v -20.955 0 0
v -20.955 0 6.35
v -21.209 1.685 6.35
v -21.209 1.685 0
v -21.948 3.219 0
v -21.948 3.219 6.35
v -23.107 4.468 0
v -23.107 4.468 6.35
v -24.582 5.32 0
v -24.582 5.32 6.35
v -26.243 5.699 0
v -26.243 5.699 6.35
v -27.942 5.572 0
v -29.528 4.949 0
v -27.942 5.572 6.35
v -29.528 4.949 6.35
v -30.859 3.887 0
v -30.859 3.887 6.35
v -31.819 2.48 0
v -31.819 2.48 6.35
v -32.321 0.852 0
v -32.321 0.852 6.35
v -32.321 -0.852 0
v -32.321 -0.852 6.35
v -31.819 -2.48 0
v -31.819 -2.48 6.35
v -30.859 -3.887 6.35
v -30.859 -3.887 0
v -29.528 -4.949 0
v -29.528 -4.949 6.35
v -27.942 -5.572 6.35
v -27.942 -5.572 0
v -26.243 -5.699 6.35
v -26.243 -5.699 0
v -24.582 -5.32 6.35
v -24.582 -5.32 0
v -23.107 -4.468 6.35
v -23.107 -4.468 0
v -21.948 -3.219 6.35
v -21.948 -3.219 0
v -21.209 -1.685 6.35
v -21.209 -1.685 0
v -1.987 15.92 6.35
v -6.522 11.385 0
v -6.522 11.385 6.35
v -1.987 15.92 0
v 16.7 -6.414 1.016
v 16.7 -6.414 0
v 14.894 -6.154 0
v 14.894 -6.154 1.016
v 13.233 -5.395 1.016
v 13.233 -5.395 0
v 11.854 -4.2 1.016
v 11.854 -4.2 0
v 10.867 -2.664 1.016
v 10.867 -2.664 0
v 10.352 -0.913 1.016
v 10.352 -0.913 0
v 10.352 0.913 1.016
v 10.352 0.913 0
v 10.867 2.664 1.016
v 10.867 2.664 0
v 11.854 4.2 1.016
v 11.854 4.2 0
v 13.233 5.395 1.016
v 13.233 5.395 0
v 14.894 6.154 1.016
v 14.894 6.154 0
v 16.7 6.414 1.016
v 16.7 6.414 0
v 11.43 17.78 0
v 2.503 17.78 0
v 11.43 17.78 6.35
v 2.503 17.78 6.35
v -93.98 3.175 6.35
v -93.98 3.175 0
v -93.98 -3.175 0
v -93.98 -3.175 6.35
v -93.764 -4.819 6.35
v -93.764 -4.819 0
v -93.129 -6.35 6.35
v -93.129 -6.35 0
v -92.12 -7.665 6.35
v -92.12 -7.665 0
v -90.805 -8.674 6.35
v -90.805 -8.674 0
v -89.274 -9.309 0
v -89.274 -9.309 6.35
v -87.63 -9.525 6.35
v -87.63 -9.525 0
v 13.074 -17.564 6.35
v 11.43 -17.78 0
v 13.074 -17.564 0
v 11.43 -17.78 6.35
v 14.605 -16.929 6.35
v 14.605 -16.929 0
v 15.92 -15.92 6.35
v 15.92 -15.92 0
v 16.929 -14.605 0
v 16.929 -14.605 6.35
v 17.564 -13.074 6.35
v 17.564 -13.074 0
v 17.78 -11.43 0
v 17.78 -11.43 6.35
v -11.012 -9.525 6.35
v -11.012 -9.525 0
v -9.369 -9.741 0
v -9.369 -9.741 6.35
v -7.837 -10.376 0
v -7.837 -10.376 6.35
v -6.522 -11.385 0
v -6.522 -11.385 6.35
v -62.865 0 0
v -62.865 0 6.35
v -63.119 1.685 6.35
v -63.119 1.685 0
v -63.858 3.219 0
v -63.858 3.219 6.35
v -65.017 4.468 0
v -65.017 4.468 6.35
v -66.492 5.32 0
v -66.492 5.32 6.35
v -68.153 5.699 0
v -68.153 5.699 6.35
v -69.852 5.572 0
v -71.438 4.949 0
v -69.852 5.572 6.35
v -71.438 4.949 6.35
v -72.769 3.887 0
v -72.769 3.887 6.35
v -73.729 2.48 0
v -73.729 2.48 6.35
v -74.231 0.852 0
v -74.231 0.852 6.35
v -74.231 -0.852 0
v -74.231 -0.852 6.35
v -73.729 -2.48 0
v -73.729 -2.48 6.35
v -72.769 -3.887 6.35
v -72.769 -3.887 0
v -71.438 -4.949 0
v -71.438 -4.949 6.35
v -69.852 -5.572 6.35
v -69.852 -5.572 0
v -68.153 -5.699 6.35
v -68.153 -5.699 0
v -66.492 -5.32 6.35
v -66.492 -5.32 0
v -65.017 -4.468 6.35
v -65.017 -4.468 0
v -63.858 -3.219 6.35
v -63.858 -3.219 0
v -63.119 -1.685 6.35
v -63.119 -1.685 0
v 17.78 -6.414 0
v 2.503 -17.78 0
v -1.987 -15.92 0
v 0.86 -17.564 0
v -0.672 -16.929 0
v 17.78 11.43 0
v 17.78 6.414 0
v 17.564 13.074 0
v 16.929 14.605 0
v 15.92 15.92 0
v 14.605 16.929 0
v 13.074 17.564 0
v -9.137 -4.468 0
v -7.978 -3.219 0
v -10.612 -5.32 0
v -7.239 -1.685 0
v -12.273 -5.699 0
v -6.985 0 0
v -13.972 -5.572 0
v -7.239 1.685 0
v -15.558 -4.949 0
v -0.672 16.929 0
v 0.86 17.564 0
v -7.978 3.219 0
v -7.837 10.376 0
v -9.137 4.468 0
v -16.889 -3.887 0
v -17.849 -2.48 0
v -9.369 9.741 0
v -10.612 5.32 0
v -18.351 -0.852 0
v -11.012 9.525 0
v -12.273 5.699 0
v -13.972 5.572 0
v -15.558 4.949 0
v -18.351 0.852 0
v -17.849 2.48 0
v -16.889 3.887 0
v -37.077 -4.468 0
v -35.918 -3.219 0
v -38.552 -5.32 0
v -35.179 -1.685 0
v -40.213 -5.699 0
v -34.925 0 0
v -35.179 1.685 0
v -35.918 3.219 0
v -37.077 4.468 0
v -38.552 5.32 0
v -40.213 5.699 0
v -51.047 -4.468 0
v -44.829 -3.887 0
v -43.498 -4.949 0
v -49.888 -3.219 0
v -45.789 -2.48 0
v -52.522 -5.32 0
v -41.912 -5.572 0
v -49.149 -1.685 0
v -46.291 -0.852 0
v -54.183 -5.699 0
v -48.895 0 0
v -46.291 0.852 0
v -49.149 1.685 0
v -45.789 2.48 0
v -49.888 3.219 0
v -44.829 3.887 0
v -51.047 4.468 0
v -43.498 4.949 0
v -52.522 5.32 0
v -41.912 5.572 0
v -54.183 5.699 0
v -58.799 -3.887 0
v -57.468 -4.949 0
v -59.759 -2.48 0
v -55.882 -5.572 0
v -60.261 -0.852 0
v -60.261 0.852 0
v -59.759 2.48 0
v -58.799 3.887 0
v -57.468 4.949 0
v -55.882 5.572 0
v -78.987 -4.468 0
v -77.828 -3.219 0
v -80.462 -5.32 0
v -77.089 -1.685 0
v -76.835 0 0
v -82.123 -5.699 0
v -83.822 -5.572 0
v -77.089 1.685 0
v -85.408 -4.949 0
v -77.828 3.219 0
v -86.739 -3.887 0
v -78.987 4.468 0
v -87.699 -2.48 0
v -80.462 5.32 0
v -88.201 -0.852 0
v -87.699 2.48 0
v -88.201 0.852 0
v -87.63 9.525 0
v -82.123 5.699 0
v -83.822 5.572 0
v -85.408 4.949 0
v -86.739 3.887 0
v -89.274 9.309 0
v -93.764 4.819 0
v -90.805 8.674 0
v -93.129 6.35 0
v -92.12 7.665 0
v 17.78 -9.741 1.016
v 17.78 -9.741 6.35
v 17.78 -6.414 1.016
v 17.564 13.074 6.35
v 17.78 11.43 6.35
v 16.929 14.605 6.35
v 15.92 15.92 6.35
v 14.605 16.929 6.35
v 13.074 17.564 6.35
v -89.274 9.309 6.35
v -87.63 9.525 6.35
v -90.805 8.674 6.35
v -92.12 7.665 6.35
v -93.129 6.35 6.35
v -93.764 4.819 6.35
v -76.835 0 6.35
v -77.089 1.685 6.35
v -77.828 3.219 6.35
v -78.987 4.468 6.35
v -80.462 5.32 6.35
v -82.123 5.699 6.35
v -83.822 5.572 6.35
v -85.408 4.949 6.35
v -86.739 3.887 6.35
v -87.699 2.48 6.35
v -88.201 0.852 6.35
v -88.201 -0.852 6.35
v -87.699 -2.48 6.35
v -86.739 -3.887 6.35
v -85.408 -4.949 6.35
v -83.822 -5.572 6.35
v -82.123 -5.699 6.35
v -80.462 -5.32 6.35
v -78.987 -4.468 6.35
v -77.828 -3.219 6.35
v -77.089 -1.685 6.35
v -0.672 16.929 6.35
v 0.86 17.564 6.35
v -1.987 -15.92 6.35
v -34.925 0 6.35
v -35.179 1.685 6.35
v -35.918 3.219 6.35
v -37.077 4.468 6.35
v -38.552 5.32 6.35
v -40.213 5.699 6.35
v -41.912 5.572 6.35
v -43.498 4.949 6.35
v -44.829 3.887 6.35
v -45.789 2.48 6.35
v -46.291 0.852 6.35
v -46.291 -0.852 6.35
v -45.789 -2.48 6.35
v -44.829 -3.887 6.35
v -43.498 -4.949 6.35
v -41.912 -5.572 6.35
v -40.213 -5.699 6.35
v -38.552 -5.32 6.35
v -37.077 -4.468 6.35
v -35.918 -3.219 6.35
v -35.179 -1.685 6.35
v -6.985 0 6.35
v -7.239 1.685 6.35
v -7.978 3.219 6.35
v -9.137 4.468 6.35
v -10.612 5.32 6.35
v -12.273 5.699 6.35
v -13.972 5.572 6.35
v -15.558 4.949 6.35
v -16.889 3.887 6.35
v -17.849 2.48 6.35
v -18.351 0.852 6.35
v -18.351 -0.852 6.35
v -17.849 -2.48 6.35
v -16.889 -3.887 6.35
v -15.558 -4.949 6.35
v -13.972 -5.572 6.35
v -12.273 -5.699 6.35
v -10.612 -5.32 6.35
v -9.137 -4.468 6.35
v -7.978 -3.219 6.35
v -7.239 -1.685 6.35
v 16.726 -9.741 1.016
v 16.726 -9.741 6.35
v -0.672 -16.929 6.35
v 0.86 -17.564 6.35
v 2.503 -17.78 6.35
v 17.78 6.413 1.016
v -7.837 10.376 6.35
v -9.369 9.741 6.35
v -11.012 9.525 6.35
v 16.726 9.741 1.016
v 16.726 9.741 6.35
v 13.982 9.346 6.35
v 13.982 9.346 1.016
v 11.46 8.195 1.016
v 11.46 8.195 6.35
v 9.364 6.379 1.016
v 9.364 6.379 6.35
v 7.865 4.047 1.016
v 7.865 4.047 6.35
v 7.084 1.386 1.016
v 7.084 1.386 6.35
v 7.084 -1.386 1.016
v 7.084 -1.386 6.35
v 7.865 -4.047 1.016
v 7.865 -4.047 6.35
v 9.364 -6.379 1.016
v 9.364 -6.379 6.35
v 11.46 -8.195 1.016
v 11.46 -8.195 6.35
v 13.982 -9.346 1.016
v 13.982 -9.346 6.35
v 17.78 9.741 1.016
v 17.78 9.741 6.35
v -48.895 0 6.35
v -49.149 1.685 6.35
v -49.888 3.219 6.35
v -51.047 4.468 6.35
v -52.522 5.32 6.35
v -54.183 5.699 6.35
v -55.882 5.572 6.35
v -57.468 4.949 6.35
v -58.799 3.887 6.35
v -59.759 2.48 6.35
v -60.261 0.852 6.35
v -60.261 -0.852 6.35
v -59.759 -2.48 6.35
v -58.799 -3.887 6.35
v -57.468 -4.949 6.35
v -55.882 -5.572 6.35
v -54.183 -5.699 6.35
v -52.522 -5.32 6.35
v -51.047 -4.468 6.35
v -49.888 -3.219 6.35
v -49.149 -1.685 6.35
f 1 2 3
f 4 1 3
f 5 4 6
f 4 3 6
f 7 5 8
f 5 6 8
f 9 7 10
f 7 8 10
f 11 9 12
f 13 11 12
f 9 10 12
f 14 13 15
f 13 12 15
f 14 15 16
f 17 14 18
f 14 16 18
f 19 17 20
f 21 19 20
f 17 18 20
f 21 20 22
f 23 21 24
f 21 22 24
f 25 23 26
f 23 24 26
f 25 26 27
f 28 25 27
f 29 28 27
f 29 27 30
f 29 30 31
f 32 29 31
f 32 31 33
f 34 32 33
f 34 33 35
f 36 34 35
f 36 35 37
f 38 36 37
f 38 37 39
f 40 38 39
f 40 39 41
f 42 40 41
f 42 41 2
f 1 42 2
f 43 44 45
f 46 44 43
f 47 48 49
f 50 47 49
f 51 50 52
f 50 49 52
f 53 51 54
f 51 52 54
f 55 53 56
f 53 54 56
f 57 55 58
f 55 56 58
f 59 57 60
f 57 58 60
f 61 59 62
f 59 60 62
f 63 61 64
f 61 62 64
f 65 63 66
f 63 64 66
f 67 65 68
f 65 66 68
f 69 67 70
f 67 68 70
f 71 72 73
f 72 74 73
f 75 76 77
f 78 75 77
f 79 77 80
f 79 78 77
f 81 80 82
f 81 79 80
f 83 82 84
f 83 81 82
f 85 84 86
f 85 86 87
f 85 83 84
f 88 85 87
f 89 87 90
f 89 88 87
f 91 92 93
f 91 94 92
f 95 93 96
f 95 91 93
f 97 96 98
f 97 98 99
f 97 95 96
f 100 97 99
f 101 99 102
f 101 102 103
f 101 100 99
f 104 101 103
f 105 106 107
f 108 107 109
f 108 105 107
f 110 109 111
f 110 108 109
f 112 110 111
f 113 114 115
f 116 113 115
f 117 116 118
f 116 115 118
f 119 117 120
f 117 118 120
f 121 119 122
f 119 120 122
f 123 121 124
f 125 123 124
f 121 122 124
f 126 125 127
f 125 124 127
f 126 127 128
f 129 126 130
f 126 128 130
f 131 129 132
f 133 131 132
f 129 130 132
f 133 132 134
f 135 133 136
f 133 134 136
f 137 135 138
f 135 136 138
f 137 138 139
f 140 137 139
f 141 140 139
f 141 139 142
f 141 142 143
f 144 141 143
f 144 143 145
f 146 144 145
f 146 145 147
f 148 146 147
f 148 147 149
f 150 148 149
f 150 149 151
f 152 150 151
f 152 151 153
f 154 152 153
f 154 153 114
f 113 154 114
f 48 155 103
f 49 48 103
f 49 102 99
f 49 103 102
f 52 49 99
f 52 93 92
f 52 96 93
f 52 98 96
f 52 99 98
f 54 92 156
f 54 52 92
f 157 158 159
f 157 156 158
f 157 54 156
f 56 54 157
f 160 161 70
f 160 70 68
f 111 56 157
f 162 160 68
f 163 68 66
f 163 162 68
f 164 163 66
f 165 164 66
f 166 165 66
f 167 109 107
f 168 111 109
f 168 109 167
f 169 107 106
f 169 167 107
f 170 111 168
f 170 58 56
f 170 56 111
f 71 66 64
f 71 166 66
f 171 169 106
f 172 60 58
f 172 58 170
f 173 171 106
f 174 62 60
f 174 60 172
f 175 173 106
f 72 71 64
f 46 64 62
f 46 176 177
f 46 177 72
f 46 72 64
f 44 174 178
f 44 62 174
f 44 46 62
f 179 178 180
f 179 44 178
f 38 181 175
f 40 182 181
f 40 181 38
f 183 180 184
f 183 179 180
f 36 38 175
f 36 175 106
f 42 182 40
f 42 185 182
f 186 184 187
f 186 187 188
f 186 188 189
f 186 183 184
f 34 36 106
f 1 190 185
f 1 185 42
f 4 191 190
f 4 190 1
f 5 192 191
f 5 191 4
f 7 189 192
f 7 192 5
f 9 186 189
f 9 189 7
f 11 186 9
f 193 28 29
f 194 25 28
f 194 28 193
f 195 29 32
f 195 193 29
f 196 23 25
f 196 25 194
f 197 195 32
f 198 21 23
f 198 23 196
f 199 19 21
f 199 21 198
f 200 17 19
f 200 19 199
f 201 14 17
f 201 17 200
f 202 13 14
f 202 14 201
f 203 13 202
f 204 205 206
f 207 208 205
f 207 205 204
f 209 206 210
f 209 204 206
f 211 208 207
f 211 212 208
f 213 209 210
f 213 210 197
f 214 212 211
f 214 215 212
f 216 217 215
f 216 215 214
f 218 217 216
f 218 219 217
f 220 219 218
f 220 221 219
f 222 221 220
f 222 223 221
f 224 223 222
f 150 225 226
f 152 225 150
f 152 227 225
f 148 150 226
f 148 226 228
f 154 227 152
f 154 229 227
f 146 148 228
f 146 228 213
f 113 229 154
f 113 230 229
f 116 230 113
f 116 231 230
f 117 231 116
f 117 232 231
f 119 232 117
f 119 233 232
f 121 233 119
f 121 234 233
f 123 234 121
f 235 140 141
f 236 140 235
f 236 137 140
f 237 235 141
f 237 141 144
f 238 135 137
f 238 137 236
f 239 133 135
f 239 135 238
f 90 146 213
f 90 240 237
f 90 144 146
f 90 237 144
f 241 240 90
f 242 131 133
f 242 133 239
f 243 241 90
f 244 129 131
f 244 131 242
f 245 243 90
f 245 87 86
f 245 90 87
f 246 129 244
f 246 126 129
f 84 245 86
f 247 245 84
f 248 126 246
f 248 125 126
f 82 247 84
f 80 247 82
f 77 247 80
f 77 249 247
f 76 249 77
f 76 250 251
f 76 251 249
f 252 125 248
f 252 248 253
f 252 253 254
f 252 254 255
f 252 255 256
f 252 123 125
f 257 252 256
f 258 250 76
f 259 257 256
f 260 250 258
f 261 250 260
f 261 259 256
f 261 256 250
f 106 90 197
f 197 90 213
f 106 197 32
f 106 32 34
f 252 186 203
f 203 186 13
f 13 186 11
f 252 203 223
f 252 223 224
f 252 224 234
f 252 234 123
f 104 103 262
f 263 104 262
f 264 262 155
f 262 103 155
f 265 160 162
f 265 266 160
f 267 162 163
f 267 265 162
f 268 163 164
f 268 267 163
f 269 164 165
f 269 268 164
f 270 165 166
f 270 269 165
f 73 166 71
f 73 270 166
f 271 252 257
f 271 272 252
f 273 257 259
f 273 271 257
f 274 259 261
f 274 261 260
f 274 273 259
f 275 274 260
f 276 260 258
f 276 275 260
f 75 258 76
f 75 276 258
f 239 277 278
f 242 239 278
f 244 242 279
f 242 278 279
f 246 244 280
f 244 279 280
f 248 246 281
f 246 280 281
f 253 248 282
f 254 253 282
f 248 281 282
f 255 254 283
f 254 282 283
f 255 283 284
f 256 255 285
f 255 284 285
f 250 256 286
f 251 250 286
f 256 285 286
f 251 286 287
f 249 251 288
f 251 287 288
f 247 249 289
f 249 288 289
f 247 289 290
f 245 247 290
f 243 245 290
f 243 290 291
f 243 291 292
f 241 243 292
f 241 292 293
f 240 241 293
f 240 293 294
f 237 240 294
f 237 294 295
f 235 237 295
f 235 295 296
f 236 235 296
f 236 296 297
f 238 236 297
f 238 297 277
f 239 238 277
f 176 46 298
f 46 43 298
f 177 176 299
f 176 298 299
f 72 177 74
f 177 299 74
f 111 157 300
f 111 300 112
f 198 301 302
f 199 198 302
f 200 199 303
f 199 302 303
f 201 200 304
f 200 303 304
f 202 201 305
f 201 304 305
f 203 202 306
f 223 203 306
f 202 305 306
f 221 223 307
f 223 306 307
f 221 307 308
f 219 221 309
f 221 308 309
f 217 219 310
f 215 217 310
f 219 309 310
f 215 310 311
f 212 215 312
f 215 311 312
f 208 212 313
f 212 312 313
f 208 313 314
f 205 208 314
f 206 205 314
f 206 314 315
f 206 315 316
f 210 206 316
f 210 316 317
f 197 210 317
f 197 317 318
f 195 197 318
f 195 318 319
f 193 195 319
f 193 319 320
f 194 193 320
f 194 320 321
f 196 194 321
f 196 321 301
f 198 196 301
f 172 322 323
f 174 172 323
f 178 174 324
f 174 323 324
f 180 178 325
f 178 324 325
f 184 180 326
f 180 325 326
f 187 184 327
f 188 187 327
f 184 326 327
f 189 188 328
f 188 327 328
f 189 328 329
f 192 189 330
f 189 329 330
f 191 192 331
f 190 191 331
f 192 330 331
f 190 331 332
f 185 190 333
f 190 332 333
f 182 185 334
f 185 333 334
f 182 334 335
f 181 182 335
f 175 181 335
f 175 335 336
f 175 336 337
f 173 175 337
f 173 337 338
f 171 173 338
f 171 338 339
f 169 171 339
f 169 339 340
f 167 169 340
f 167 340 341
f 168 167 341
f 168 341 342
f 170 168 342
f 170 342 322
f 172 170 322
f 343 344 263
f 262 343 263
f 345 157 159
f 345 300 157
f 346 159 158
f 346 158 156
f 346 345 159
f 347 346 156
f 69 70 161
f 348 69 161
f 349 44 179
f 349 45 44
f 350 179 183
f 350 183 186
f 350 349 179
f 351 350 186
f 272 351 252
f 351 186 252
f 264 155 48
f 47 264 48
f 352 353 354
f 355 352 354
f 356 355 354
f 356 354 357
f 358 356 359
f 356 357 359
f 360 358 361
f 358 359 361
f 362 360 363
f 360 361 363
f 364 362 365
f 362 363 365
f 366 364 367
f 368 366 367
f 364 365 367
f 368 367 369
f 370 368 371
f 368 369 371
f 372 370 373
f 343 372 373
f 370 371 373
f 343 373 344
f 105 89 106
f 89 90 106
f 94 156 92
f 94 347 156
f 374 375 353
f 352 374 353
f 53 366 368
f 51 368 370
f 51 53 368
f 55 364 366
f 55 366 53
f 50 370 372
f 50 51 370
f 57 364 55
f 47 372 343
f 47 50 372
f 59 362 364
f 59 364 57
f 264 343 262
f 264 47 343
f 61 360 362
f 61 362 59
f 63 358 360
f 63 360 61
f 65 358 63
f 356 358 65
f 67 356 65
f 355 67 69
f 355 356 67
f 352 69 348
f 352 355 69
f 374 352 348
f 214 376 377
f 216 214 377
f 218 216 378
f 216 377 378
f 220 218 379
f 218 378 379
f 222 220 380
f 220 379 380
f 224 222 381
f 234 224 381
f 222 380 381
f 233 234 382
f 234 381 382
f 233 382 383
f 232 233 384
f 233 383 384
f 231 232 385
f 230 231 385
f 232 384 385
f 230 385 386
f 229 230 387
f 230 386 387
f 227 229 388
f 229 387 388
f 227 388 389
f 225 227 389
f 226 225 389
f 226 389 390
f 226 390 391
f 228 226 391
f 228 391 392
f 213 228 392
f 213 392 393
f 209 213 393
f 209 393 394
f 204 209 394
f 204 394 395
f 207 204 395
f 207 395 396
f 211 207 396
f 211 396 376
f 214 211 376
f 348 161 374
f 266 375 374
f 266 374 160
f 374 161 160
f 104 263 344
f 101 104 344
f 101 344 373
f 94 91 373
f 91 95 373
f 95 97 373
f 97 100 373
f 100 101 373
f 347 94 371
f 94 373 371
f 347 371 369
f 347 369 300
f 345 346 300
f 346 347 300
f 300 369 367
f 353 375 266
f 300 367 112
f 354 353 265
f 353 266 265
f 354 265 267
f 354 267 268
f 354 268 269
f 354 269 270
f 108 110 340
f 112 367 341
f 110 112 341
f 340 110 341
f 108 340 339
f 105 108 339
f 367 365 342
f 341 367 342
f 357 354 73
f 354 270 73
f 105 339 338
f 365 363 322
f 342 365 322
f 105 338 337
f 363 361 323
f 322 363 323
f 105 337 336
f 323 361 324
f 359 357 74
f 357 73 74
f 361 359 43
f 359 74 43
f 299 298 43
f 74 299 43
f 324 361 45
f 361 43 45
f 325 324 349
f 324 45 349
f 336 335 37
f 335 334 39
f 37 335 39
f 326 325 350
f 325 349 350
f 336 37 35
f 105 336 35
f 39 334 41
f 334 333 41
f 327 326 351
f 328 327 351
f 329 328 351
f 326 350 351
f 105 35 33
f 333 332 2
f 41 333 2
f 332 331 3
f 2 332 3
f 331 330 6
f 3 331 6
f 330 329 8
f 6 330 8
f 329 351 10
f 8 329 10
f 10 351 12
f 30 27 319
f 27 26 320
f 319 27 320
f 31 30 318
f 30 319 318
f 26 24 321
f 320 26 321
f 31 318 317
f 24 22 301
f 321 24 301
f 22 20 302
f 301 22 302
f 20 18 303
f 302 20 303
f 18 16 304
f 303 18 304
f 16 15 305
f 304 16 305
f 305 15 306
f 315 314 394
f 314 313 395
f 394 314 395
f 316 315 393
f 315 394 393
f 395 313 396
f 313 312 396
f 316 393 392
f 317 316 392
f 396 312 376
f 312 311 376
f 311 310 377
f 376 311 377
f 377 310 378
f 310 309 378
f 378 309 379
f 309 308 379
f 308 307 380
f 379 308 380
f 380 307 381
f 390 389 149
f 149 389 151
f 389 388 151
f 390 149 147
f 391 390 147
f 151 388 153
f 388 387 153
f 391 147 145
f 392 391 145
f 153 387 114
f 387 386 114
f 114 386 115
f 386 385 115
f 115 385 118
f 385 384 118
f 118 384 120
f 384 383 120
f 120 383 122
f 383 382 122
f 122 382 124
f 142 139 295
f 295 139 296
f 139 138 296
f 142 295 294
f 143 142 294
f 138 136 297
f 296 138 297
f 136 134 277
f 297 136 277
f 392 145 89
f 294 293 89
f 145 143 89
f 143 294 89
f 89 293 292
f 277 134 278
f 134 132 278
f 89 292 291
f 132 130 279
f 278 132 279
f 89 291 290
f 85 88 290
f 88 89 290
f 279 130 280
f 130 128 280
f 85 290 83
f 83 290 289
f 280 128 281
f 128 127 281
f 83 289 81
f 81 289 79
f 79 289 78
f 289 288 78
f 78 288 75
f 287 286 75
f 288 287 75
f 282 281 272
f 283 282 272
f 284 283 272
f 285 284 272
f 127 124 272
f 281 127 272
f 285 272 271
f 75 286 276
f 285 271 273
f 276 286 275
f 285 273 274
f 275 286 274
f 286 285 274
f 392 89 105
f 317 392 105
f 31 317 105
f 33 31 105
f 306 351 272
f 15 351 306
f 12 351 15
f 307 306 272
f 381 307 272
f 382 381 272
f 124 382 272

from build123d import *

# Parameters (mm, degrees)
F1_DEPTH    = 6.35
F3_DEPTH    = 5.334
F4_W        = 17.78
F4_H        = 8.255
F5_DEPTH    = 25.4
F6_R        = 5.715
F7_DEPTH    = 25.4
F8_T4_DEPTH = 6.35
F8_T9_DEPTH = 6.35
F9_R        = 6.35


# Not quite as in the source:
# - a fillet or chamfer that OpenCascade refuses, or shapes differently, is made with other operations: its cross-section is extruded or revolved along the edge and cut away or added


with BuildPart() as f1:
    # F0 (on Top) → F1 (new body)
    with BuildSketch(Plane.XY):
        Polygon((8.1444730278, -17.78), (17.78, -17.78), (17.78, 17.78), (-17.78, 17.78), (-17.78, 9.525), (-93.98, 9.525), (-93.98, -9.525), (-17.78, -9.525), (-17.78, -17.78), (-8.1444730278, -17.78), align=None)
    extrude(amount=F1_DEPTH)

    # F2 (on face) → F3 (cut)
    with BuildSketch(Plane.XY.offset(6.35)):
        with BuildLine():
            Line((17.78, 9.7409), (16.7259, 9.7409))
            ThreePointArc((16.7259, 9.7409), (6.985, 0), (16.7259, -9.7409))
            Line((16.7259, -9.7409), (17.78, -9.7409))
            Line((17.78, -9.7409), (17.78, 9.7409))
        make_face()
    extrude(amount=-F3_DEPTH, mode=Mode.SUBTRACT)

    # F4 (on face) → F5 (cut)
    with BuildSketch(Plane(origin=(0, 0, 0), x_dir=(1, 0, 0), z_dir=(0, 0, -1))):
        with BuildLine():
            Line((17.78, 6.4135), (16.7005, 6.4135))
            ThreePointArc((16.7005, 6.4135), (10.287, 0), (16.7005, -6.4135))
            Line((16.7005, -6.4135), (17.78, -6.4135))
            Line((17.78, -6.4135), (17.78, 6.4135))
        make_face()
        with Locations((-8.89, -13.6525)):
            Rectangle(F4_W, F4_H)
        with Locations((-8.89, 13.6525)):
            Rectangle(F4_W, F4_H)
    extrude(amount=-F5_DEPTH, mode=Mode.SUBTRACT)

    # F6 (on face) → F7 (cut)
    with BuildSketch(Plane.XY.offset(6.35)):
        with Locations((-82.55, 0)):
            Circle(F6_R)
        with Locations((-68.58, 0)):
            Circle(F6_R)
        with Locations((-54.61, 0)):
            Circle(F6_R)
        with Locations((-40.64, 0)):
            Circle(F6_R)
        with Locations((-26.67, 0)):
            Circle(F6_R)
        with Locations((-12.7, 0)):
            Circle(F6_R)
    extrude(amount=-F7_DEPTH, mode=Mode.SUBTRACT)

    # F8: chamfer of 8.382 on 2 edges, made by hand


with BuildPart() as f8_tool2:
    # F8_s3 → F8_t4 (new body)
    with BuildSketch(Plane.XY):
        Polygon((0, -17.907), (-8.382, -9.525), (0, -9.525), align=None)
    extrude(amount=F8_T4_DEPTH)

    split(bisect_by=Plane.XZ.offset(17.78), keep=Keep.BOTTOM)


with BuildPart() as f1_1:
    add(f1.part)

    # F8_t1: union F8_tool2
    add(f8_tool2.part)


with BuildPart() as f8_tool7:
    # F8_s8 → F8_t9 (new body)
    with BuildSketch(Plane.XY):
        Polygon((-8.382, 9.525), (0, 17.907), (0, 9.525), align=None)
    extrude(amount=F8_T9_DEPTH)

    split(bisect_by=Plane.XZ.offset(-17.78), keep=Keep.TOP)


with BuildPart() as f1_2:
    add(f1_1.part)

    # F8_t6: union F8_tool7
    add(f8_tool7.part)

    # F9
    f9_edges = [f1_2.edges().sort_by_distance(p)[0] for p in [
        (-8.382, -9.525, 3.175),
        (-8.382, 9.525, 3.175),
        (-0.127, 17.78, 3.175),
        (-0.127, -17.78, 3.175),
        (-93.98, 9.525, 3.175),
        (-93.98, -9.525, 3.175),
        (17.78, 17.78, 3.175),
        (17.78, -17.78, 3.175),
    ]]
    fillet(f9_edges, radius=F9_R)


solid = f1_2.part
